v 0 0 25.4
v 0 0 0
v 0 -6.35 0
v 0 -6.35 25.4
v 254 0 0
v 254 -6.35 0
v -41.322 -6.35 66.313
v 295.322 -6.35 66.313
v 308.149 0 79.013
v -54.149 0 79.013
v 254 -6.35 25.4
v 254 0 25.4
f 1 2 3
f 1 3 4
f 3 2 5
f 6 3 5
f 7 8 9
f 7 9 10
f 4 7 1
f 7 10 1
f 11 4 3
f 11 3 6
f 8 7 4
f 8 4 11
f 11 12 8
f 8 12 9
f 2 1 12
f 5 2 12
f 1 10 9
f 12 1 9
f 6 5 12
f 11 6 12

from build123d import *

# Parameters (mm, degrees)
F0_W     = 254
F0_H     = 25.4
F1_DEPTH = 6.35
F2_SIZE2 = 12.69999
F2_SIZE  = 6.34999


# Not quite as in the source:
# - a fillet or chamfer is up to 0.001 mm smaller than in the source, because OpenCascade refuses the exact size


with BuildPart() as f1:
    # F0 (on Front) → F1 (new body)
    with BuildSketch(Plane.XZ):
        with Locations((127, 12.7)):
            Rectangle(F0_W, F0_H)
        Polygon((-54.1485526787, 79.0131909403), (0, 25.4), (254, 25.4), (308.1485526787, 79.0131909403), align=None)
    extrude(amount=F1_DEPTH)

    # F2 (size 6.35 and 12.7 in the source; OpenCascade refuses exactly that, so slightly less here)
    f2_edges = [f1.edges().sort_by_distance(p)[0] for p in [
        (127, -6.35, 79.013191),
    ]]
    f2_side = f1.faces().sort_by_distance((127, -3.175, 79.013191))[0]
    chamfer(f2_edges, length=F2_SIZE, length2=F2_SIZE2, reference=f2_side)


solid = f1.part
